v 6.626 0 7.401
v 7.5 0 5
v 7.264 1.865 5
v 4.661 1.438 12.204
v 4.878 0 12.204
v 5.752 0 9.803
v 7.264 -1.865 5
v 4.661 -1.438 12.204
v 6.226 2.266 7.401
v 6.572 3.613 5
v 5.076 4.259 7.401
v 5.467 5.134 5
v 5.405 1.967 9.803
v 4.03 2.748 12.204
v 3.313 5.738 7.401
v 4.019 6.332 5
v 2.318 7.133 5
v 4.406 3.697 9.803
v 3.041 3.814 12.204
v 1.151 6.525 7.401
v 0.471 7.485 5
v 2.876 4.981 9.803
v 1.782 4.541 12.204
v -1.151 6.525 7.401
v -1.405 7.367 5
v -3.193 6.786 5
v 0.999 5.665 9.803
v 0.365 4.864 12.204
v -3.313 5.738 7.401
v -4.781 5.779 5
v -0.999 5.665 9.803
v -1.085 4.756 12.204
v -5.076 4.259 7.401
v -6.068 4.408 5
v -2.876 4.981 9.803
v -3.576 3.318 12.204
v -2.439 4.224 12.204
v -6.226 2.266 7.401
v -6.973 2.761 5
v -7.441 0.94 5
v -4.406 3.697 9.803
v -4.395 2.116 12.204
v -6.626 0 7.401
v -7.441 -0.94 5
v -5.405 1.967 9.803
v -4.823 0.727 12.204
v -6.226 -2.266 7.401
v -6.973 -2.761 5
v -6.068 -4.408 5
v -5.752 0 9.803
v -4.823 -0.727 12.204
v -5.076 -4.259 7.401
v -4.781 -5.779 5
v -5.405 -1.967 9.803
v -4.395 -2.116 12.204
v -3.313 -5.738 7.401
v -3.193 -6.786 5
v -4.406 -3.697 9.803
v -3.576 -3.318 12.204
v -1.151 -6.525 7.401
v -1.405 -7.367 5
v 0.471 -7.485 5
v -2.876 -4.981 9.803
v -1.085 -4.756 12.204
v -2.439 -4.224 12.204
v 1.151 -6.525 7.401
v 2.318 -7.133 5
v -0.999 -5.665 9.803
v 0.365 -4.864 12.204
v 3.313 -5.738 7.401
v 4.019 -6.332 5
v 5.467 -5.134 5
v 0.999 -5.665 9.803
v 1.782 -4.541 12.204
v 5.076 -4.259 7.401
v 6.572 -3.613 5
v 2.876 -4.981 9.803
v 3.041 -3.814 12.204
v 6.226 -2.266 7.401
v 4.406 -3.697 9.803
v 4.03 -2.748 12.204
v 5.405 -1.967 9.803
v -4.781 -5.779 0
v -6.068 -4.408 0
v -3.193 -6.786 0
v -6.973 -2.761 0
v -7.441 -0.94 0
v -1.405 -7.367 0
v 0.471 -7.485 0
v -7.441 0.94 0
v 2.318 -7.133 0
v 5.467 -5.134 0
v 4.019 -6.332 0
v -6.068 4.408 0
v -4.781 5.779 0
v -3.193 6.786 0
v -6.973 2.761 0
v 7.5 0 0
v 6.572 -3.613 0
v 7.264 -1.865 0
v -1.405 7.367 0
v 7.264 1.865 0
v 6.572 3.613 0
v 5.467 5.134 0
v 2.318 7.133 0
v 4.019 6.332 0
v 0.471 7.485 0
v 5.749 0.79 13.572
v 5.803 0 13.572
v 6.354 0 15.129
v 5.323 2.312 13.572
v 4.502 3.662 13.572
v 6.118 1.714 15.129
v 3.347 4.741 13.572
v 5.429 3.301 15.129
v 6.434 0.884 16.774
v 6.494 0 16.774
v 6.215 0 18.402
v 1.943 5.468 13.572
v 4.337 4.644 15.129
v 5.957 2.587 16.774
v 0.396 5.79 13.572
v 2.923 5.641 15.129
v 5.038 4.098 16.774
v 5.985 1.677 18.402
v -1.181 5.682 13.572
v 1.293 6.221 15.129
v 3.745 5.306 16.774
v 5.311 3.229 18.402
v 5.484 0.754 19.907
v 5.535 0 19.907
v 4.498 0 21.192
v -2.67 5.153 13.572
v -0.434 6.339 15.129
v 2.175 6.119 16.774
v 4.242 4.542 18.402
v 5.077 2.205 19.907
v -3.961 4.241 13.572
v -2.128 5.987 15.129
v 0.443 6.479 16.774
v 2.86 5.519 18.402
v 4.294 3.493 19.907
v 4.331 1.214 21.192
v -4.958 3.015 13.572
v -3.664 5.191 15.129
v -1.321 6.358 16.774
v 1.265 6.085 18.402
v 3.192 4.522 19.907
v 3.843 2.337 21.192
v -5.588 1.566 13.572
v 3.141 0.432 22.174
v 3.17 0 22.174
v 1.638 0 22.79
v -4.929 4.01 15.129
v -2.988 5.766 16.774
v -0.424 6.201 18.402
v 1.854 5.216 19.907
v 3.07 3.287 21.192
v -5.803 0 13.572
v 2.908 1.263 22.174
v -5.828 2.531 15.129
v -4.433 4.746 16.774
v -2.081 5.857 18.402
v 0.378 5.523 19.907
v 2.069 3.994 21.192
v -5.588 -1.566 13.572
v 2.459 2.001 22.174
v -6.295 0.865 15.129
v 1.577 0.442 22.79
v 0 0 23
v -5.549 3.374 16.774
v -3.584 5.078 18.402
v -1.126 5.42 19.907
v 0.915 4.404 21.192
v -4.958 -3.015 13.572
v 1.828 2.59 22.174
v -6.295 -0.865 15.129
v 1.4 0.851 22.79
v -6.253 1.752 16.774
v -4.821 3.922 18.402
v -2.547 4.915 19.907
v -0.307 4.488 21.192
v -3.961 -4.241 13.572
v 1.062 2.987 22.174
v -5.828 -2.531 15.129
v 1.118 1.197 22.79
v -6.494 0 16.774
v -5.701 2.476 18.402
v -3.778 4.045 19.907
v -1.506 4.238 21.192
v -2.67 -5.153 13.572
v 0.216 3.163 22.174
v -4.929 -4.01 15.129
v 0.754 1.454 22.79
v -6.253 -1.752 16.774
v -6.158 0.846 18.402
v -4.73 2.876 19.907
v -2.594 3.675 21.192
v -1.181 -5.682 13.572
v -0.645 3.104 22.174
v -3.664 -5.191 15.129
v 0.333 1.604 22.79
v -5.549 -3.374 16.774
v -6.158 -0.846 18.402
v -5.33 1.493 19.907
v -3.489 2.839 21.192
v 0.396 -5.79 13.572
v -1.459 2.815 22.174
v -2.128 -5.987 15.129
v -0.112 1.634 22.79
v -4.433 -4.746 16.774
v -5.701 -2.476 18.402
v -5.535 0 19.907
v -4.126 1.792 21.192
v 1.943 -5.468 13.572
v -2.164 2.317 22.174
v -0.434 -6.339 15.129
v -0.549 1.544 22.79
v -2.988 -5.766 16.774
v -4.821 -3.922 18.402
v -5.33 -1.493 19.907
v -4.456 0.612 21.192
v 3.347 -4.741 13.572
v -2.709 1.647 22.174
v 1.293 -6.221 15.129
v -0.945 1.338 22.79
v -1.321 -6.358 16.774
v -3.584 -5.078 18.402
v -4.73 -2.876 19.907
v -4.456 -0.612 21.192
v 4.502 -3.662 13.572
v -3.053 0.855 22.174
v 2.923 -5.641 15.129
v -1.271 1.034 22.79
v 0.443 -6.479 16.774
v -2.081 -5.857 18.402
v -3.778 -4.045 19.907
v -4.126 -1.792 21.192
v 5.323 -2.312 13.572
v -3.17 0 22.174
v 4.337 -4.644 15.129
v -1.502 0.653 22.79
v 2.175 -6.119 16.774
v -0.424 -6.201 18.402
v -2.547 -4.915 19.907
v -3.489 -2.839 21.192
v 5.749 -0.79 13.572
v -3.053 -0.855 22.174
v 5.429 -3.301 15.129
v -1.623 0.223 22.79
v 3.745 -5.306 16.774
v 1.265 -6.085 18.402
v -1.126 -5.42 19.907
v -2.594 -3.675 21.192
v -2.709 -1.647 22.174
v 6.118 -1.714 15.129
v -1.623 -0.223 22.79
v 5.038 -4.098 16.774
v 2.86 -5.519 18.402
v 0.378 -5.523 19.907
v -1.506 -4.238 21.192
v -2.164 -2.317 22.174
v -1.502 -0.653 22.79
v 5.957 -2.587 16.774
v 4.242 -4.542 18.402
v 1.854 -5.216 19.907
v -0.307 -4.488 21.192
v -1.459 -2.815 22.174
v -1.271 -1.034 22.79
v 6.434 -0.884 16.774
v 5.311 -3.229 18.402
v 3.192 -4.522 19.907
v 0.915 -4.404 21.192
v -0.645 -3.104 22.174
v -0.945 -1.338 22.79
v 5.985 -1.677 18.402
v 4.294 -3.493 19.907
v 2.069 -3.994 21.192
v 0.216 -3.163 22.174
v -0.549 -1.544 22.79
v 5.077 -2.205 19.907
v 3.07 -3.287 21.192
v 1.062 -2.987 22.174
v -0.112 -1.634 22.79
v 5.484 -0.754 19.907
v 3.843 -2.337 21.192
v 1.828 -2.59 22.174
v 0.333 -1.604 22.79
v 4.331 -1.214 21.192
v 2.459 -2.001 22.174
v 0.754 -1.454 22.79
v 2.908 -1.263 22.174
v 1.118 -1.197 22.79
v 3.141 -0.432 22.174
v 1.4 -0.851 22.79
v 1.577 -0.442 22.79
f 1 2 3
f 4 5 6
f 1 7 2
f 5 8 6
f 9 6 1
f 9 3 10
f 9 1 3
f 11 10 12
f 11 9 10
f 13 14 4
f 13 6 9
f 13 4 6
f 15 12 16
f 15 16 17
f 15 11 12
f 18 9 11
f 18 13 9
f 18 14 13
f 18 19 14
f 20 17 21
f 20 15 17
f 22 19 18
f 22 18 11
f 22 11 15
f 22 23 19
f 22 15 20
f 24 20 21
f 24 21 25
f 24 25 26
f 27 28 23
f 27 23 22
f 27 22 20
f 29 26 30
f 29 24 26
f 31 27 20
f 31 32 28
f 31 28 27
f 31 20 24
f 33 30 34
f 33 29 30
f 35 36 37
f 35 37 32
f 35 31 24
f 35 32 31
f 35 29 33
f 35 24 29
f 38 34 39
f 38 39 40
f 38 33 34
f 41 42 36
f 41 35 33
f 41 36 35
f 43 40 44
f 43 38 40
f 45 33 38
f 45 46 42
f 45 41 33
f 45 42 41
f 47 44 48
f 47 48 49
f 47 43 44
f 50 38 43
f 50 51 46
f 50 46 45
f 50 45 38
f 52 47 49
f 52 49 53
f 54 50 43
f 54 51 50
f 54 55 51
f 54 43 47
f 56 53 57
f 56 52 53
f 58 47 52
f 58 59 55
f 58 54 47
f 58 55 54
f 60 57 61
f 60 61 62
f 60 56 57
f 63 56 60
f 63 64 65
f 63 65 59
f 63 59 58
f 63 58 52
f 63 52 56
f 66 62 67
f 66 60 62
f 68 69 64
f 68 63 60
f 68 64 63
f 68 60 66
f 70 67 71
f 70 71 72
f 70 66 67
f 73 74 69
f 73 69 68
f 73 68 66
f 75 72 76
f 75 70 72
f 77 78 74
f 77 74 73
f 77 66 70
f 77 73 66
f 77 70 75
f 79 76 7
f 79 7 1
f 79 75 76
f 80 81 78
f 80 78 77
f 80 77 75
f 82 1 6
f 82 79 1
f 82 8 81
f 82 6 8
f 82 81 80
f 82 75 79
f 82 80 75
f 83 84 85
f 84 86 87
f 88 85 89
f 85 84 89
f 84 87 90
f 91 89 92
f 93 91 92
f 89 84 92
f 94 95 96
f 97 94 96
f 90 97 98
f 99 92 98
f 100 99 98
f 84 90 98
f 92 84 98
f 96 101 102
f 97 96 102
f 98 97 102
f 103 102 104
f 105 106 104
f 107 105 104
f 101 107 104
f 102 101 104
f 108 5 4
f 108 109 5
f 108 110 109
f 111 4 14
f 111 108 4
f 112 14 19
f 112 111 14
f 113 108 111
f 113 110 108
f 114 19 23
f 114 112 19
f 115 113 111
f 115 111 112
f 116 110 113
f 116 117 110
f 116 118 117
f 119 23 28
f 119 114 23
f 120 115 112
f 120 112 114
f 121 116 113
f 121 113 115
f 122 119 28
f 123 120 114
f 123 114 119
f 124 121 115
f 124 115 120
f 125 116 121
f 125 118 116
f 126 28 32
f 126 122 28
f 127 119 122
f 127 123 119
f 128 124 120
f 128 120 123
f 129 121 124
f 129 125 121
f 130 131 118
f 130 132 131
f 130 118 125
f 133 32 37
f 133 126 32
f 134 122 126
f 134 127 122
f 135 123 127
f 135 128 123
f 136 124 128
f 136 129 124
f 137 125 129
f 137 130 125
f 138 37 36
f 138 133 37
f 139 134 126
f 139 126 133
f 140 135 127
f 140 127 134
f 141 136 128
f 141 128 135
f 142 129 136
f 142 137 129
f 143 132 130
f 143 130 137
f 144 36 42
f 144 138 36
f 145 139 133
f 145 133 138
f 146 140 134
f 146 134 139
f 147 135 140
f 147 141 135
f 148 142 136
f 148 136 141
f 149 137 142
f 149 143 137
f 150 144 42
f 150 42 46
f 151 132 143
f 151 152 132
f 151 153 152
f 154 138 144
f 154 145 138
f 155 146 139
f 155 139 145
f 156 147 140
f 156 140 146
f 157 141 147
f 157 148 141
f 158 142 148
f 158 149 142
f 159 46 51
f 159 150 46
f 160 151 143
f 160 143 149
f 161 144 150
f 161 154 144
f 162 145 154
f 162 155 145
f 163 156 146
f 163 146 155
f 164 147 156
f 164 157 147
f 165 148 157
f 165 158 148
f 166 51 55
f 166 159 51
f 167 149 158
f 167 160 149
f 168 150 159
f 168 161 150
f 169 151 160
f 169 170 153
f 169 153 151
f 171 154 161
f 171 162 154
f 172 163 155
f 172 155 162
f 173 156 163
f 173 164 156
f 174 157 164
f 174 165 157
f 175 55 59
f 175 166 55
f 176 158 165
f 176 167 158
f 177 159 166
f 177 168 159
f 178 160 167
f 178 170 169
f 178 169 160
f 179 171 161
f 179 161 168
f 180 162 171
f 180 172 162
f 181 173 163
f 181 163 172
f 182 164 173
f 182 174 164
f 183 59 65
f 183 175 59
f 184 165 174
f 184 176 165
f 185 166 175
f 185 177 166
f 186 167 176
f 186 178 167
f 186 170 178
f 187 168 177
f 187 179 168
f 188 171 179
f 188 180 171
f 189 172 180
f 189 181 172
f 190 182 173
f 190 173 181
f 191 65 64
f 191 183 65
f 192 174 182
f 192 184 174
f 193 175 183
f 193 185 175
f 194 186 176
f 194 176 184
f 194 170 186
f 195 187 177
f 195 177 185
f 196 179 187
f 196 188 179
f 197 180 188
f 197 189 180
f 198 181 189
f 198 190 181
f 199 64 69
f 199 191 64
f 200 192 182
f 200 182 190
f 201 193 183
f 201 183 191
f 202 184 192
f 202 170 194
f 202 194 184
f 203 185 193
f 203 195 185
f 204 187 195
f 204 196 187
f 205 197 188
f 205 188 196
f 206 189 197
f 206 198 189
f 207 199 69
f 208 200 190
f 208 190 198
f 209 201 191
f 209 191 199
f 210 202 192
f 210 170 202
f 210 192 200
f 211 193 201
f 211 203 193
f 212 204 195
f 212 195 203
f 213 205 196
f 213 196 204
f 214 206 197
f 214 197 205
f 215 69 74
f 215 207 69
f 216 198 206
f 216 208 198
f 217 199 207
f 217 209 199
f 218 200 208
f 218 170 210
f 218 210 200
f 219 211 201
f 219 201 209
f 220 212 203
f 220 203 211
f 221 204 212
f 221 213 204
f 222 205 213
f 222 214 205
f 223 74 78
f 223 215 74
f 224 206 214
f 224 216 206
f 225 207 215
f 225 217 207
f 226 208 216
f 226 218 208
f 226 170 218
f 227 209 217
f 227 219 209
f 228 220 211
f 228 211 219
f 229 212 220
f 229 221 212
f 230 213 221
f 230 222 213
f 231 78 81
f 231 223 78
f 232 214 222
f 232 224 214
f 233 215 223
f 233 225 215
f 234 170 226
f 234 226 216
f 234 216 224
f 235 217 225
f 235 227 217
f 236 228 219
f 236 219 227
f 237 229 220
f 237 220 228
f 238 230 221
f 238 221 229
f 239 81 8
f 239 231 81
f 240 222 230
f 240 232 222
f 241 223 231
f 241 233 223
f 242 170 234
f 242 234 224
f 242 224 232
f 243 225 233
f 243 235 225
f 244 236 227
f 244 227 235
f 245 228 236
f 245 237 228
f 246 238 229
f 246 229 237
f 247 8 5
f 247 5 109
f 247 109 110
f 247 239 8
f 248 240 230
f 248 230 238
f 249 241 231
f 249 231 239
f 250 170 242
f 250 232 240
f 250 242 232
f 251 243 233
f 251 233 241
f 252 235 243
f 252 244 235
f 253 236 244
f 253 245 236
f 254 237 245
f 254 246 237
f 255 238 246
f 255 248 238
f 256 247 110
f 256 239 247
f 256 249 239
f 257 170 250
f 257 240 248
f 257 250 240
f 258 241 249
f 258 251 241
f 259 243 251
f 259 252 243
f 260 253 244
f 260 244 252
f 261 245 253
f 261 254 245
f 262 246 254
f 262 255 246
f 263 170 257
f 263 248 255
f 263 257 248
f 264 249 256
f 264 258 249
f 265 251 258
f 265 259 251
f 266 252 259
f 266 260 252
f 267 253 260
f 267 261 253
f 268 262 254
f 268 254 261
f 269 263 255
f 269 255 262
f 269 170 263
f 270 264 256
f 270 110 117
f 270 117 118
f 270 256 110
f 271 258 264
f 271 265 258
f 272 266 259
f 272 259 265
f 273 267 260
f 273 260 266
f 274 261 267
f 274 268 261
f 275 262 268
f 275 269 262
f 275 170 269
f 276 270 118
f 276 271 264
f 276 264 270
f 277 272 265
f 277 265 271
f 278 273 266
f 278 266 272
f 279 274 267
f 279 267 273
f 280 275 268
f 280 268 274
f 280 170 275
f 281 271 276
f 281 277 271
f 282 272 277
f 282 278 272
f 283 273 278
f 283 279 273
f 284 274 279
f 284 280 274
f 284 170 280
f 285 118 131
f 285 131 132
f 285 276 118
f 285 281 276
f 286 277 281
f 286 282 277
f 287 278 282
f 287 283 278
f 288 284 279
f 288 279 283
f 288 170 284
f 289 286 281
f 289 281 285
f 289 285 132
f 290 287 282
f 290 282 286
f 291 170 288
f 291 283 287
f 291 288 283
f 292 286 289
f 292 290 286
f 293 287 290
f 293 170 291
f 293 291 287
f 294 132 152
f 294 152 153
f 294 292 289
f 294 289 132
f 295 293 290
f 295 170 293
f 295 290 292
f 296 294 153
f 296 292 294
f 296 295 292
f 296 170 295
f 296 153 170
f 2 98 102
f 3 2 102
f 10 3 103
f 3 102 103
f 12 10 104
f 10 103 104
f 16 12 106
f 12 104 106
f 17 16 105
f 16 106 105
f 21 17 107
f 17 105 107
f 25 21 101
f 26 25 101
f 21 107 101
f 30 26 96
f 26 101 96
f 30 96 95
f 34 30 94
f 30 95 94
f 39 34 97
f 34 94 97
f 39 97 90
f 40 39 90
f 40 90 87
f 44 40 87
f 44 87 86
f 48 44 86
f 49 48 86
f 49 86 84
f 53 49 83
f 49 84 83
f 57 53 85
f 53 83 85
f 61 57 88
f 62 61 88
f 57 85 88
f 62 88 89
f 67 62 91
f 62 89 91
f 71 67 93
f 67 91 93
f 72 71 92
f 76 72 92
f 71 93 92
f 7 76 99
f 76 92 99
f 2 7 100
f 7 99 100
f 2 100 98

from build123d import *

# Parameters (mm, degrees)
F0_R      = 7.5
F1_DEPTH  = 5
F1_FACE_R = 7.5
F2_DEPTH  = 10
F2_TAPER  = 20


with BuildPart() as f1:
    # F0 (on Top) → F1 (new body)
    with BuildSketch(Plane.XY):
        Circle(F0_R)
    extrude(amount=F1_DEPTH)

    # F1_face (on face) → F2 (join)
    with BuildSketch(Plane.XY.offset(5)):
        Circle(F1_FACE_R)
    extrude(amount=F2_DEPTH, taper=F2_TAPER)

    # F3 (on Front) → F4 (revolve)
    with BuildSketch(Plane.XZ):
        with BuildLine():
            Line((0, 23), (0, 10))
            ThreePointArc((0, 10), (6.5, 16.5), (0, 23))
        make_face()
    revolve(axis=Axis((0, 0, 16.5), (0, 0, 1)))


solid = f1.part
